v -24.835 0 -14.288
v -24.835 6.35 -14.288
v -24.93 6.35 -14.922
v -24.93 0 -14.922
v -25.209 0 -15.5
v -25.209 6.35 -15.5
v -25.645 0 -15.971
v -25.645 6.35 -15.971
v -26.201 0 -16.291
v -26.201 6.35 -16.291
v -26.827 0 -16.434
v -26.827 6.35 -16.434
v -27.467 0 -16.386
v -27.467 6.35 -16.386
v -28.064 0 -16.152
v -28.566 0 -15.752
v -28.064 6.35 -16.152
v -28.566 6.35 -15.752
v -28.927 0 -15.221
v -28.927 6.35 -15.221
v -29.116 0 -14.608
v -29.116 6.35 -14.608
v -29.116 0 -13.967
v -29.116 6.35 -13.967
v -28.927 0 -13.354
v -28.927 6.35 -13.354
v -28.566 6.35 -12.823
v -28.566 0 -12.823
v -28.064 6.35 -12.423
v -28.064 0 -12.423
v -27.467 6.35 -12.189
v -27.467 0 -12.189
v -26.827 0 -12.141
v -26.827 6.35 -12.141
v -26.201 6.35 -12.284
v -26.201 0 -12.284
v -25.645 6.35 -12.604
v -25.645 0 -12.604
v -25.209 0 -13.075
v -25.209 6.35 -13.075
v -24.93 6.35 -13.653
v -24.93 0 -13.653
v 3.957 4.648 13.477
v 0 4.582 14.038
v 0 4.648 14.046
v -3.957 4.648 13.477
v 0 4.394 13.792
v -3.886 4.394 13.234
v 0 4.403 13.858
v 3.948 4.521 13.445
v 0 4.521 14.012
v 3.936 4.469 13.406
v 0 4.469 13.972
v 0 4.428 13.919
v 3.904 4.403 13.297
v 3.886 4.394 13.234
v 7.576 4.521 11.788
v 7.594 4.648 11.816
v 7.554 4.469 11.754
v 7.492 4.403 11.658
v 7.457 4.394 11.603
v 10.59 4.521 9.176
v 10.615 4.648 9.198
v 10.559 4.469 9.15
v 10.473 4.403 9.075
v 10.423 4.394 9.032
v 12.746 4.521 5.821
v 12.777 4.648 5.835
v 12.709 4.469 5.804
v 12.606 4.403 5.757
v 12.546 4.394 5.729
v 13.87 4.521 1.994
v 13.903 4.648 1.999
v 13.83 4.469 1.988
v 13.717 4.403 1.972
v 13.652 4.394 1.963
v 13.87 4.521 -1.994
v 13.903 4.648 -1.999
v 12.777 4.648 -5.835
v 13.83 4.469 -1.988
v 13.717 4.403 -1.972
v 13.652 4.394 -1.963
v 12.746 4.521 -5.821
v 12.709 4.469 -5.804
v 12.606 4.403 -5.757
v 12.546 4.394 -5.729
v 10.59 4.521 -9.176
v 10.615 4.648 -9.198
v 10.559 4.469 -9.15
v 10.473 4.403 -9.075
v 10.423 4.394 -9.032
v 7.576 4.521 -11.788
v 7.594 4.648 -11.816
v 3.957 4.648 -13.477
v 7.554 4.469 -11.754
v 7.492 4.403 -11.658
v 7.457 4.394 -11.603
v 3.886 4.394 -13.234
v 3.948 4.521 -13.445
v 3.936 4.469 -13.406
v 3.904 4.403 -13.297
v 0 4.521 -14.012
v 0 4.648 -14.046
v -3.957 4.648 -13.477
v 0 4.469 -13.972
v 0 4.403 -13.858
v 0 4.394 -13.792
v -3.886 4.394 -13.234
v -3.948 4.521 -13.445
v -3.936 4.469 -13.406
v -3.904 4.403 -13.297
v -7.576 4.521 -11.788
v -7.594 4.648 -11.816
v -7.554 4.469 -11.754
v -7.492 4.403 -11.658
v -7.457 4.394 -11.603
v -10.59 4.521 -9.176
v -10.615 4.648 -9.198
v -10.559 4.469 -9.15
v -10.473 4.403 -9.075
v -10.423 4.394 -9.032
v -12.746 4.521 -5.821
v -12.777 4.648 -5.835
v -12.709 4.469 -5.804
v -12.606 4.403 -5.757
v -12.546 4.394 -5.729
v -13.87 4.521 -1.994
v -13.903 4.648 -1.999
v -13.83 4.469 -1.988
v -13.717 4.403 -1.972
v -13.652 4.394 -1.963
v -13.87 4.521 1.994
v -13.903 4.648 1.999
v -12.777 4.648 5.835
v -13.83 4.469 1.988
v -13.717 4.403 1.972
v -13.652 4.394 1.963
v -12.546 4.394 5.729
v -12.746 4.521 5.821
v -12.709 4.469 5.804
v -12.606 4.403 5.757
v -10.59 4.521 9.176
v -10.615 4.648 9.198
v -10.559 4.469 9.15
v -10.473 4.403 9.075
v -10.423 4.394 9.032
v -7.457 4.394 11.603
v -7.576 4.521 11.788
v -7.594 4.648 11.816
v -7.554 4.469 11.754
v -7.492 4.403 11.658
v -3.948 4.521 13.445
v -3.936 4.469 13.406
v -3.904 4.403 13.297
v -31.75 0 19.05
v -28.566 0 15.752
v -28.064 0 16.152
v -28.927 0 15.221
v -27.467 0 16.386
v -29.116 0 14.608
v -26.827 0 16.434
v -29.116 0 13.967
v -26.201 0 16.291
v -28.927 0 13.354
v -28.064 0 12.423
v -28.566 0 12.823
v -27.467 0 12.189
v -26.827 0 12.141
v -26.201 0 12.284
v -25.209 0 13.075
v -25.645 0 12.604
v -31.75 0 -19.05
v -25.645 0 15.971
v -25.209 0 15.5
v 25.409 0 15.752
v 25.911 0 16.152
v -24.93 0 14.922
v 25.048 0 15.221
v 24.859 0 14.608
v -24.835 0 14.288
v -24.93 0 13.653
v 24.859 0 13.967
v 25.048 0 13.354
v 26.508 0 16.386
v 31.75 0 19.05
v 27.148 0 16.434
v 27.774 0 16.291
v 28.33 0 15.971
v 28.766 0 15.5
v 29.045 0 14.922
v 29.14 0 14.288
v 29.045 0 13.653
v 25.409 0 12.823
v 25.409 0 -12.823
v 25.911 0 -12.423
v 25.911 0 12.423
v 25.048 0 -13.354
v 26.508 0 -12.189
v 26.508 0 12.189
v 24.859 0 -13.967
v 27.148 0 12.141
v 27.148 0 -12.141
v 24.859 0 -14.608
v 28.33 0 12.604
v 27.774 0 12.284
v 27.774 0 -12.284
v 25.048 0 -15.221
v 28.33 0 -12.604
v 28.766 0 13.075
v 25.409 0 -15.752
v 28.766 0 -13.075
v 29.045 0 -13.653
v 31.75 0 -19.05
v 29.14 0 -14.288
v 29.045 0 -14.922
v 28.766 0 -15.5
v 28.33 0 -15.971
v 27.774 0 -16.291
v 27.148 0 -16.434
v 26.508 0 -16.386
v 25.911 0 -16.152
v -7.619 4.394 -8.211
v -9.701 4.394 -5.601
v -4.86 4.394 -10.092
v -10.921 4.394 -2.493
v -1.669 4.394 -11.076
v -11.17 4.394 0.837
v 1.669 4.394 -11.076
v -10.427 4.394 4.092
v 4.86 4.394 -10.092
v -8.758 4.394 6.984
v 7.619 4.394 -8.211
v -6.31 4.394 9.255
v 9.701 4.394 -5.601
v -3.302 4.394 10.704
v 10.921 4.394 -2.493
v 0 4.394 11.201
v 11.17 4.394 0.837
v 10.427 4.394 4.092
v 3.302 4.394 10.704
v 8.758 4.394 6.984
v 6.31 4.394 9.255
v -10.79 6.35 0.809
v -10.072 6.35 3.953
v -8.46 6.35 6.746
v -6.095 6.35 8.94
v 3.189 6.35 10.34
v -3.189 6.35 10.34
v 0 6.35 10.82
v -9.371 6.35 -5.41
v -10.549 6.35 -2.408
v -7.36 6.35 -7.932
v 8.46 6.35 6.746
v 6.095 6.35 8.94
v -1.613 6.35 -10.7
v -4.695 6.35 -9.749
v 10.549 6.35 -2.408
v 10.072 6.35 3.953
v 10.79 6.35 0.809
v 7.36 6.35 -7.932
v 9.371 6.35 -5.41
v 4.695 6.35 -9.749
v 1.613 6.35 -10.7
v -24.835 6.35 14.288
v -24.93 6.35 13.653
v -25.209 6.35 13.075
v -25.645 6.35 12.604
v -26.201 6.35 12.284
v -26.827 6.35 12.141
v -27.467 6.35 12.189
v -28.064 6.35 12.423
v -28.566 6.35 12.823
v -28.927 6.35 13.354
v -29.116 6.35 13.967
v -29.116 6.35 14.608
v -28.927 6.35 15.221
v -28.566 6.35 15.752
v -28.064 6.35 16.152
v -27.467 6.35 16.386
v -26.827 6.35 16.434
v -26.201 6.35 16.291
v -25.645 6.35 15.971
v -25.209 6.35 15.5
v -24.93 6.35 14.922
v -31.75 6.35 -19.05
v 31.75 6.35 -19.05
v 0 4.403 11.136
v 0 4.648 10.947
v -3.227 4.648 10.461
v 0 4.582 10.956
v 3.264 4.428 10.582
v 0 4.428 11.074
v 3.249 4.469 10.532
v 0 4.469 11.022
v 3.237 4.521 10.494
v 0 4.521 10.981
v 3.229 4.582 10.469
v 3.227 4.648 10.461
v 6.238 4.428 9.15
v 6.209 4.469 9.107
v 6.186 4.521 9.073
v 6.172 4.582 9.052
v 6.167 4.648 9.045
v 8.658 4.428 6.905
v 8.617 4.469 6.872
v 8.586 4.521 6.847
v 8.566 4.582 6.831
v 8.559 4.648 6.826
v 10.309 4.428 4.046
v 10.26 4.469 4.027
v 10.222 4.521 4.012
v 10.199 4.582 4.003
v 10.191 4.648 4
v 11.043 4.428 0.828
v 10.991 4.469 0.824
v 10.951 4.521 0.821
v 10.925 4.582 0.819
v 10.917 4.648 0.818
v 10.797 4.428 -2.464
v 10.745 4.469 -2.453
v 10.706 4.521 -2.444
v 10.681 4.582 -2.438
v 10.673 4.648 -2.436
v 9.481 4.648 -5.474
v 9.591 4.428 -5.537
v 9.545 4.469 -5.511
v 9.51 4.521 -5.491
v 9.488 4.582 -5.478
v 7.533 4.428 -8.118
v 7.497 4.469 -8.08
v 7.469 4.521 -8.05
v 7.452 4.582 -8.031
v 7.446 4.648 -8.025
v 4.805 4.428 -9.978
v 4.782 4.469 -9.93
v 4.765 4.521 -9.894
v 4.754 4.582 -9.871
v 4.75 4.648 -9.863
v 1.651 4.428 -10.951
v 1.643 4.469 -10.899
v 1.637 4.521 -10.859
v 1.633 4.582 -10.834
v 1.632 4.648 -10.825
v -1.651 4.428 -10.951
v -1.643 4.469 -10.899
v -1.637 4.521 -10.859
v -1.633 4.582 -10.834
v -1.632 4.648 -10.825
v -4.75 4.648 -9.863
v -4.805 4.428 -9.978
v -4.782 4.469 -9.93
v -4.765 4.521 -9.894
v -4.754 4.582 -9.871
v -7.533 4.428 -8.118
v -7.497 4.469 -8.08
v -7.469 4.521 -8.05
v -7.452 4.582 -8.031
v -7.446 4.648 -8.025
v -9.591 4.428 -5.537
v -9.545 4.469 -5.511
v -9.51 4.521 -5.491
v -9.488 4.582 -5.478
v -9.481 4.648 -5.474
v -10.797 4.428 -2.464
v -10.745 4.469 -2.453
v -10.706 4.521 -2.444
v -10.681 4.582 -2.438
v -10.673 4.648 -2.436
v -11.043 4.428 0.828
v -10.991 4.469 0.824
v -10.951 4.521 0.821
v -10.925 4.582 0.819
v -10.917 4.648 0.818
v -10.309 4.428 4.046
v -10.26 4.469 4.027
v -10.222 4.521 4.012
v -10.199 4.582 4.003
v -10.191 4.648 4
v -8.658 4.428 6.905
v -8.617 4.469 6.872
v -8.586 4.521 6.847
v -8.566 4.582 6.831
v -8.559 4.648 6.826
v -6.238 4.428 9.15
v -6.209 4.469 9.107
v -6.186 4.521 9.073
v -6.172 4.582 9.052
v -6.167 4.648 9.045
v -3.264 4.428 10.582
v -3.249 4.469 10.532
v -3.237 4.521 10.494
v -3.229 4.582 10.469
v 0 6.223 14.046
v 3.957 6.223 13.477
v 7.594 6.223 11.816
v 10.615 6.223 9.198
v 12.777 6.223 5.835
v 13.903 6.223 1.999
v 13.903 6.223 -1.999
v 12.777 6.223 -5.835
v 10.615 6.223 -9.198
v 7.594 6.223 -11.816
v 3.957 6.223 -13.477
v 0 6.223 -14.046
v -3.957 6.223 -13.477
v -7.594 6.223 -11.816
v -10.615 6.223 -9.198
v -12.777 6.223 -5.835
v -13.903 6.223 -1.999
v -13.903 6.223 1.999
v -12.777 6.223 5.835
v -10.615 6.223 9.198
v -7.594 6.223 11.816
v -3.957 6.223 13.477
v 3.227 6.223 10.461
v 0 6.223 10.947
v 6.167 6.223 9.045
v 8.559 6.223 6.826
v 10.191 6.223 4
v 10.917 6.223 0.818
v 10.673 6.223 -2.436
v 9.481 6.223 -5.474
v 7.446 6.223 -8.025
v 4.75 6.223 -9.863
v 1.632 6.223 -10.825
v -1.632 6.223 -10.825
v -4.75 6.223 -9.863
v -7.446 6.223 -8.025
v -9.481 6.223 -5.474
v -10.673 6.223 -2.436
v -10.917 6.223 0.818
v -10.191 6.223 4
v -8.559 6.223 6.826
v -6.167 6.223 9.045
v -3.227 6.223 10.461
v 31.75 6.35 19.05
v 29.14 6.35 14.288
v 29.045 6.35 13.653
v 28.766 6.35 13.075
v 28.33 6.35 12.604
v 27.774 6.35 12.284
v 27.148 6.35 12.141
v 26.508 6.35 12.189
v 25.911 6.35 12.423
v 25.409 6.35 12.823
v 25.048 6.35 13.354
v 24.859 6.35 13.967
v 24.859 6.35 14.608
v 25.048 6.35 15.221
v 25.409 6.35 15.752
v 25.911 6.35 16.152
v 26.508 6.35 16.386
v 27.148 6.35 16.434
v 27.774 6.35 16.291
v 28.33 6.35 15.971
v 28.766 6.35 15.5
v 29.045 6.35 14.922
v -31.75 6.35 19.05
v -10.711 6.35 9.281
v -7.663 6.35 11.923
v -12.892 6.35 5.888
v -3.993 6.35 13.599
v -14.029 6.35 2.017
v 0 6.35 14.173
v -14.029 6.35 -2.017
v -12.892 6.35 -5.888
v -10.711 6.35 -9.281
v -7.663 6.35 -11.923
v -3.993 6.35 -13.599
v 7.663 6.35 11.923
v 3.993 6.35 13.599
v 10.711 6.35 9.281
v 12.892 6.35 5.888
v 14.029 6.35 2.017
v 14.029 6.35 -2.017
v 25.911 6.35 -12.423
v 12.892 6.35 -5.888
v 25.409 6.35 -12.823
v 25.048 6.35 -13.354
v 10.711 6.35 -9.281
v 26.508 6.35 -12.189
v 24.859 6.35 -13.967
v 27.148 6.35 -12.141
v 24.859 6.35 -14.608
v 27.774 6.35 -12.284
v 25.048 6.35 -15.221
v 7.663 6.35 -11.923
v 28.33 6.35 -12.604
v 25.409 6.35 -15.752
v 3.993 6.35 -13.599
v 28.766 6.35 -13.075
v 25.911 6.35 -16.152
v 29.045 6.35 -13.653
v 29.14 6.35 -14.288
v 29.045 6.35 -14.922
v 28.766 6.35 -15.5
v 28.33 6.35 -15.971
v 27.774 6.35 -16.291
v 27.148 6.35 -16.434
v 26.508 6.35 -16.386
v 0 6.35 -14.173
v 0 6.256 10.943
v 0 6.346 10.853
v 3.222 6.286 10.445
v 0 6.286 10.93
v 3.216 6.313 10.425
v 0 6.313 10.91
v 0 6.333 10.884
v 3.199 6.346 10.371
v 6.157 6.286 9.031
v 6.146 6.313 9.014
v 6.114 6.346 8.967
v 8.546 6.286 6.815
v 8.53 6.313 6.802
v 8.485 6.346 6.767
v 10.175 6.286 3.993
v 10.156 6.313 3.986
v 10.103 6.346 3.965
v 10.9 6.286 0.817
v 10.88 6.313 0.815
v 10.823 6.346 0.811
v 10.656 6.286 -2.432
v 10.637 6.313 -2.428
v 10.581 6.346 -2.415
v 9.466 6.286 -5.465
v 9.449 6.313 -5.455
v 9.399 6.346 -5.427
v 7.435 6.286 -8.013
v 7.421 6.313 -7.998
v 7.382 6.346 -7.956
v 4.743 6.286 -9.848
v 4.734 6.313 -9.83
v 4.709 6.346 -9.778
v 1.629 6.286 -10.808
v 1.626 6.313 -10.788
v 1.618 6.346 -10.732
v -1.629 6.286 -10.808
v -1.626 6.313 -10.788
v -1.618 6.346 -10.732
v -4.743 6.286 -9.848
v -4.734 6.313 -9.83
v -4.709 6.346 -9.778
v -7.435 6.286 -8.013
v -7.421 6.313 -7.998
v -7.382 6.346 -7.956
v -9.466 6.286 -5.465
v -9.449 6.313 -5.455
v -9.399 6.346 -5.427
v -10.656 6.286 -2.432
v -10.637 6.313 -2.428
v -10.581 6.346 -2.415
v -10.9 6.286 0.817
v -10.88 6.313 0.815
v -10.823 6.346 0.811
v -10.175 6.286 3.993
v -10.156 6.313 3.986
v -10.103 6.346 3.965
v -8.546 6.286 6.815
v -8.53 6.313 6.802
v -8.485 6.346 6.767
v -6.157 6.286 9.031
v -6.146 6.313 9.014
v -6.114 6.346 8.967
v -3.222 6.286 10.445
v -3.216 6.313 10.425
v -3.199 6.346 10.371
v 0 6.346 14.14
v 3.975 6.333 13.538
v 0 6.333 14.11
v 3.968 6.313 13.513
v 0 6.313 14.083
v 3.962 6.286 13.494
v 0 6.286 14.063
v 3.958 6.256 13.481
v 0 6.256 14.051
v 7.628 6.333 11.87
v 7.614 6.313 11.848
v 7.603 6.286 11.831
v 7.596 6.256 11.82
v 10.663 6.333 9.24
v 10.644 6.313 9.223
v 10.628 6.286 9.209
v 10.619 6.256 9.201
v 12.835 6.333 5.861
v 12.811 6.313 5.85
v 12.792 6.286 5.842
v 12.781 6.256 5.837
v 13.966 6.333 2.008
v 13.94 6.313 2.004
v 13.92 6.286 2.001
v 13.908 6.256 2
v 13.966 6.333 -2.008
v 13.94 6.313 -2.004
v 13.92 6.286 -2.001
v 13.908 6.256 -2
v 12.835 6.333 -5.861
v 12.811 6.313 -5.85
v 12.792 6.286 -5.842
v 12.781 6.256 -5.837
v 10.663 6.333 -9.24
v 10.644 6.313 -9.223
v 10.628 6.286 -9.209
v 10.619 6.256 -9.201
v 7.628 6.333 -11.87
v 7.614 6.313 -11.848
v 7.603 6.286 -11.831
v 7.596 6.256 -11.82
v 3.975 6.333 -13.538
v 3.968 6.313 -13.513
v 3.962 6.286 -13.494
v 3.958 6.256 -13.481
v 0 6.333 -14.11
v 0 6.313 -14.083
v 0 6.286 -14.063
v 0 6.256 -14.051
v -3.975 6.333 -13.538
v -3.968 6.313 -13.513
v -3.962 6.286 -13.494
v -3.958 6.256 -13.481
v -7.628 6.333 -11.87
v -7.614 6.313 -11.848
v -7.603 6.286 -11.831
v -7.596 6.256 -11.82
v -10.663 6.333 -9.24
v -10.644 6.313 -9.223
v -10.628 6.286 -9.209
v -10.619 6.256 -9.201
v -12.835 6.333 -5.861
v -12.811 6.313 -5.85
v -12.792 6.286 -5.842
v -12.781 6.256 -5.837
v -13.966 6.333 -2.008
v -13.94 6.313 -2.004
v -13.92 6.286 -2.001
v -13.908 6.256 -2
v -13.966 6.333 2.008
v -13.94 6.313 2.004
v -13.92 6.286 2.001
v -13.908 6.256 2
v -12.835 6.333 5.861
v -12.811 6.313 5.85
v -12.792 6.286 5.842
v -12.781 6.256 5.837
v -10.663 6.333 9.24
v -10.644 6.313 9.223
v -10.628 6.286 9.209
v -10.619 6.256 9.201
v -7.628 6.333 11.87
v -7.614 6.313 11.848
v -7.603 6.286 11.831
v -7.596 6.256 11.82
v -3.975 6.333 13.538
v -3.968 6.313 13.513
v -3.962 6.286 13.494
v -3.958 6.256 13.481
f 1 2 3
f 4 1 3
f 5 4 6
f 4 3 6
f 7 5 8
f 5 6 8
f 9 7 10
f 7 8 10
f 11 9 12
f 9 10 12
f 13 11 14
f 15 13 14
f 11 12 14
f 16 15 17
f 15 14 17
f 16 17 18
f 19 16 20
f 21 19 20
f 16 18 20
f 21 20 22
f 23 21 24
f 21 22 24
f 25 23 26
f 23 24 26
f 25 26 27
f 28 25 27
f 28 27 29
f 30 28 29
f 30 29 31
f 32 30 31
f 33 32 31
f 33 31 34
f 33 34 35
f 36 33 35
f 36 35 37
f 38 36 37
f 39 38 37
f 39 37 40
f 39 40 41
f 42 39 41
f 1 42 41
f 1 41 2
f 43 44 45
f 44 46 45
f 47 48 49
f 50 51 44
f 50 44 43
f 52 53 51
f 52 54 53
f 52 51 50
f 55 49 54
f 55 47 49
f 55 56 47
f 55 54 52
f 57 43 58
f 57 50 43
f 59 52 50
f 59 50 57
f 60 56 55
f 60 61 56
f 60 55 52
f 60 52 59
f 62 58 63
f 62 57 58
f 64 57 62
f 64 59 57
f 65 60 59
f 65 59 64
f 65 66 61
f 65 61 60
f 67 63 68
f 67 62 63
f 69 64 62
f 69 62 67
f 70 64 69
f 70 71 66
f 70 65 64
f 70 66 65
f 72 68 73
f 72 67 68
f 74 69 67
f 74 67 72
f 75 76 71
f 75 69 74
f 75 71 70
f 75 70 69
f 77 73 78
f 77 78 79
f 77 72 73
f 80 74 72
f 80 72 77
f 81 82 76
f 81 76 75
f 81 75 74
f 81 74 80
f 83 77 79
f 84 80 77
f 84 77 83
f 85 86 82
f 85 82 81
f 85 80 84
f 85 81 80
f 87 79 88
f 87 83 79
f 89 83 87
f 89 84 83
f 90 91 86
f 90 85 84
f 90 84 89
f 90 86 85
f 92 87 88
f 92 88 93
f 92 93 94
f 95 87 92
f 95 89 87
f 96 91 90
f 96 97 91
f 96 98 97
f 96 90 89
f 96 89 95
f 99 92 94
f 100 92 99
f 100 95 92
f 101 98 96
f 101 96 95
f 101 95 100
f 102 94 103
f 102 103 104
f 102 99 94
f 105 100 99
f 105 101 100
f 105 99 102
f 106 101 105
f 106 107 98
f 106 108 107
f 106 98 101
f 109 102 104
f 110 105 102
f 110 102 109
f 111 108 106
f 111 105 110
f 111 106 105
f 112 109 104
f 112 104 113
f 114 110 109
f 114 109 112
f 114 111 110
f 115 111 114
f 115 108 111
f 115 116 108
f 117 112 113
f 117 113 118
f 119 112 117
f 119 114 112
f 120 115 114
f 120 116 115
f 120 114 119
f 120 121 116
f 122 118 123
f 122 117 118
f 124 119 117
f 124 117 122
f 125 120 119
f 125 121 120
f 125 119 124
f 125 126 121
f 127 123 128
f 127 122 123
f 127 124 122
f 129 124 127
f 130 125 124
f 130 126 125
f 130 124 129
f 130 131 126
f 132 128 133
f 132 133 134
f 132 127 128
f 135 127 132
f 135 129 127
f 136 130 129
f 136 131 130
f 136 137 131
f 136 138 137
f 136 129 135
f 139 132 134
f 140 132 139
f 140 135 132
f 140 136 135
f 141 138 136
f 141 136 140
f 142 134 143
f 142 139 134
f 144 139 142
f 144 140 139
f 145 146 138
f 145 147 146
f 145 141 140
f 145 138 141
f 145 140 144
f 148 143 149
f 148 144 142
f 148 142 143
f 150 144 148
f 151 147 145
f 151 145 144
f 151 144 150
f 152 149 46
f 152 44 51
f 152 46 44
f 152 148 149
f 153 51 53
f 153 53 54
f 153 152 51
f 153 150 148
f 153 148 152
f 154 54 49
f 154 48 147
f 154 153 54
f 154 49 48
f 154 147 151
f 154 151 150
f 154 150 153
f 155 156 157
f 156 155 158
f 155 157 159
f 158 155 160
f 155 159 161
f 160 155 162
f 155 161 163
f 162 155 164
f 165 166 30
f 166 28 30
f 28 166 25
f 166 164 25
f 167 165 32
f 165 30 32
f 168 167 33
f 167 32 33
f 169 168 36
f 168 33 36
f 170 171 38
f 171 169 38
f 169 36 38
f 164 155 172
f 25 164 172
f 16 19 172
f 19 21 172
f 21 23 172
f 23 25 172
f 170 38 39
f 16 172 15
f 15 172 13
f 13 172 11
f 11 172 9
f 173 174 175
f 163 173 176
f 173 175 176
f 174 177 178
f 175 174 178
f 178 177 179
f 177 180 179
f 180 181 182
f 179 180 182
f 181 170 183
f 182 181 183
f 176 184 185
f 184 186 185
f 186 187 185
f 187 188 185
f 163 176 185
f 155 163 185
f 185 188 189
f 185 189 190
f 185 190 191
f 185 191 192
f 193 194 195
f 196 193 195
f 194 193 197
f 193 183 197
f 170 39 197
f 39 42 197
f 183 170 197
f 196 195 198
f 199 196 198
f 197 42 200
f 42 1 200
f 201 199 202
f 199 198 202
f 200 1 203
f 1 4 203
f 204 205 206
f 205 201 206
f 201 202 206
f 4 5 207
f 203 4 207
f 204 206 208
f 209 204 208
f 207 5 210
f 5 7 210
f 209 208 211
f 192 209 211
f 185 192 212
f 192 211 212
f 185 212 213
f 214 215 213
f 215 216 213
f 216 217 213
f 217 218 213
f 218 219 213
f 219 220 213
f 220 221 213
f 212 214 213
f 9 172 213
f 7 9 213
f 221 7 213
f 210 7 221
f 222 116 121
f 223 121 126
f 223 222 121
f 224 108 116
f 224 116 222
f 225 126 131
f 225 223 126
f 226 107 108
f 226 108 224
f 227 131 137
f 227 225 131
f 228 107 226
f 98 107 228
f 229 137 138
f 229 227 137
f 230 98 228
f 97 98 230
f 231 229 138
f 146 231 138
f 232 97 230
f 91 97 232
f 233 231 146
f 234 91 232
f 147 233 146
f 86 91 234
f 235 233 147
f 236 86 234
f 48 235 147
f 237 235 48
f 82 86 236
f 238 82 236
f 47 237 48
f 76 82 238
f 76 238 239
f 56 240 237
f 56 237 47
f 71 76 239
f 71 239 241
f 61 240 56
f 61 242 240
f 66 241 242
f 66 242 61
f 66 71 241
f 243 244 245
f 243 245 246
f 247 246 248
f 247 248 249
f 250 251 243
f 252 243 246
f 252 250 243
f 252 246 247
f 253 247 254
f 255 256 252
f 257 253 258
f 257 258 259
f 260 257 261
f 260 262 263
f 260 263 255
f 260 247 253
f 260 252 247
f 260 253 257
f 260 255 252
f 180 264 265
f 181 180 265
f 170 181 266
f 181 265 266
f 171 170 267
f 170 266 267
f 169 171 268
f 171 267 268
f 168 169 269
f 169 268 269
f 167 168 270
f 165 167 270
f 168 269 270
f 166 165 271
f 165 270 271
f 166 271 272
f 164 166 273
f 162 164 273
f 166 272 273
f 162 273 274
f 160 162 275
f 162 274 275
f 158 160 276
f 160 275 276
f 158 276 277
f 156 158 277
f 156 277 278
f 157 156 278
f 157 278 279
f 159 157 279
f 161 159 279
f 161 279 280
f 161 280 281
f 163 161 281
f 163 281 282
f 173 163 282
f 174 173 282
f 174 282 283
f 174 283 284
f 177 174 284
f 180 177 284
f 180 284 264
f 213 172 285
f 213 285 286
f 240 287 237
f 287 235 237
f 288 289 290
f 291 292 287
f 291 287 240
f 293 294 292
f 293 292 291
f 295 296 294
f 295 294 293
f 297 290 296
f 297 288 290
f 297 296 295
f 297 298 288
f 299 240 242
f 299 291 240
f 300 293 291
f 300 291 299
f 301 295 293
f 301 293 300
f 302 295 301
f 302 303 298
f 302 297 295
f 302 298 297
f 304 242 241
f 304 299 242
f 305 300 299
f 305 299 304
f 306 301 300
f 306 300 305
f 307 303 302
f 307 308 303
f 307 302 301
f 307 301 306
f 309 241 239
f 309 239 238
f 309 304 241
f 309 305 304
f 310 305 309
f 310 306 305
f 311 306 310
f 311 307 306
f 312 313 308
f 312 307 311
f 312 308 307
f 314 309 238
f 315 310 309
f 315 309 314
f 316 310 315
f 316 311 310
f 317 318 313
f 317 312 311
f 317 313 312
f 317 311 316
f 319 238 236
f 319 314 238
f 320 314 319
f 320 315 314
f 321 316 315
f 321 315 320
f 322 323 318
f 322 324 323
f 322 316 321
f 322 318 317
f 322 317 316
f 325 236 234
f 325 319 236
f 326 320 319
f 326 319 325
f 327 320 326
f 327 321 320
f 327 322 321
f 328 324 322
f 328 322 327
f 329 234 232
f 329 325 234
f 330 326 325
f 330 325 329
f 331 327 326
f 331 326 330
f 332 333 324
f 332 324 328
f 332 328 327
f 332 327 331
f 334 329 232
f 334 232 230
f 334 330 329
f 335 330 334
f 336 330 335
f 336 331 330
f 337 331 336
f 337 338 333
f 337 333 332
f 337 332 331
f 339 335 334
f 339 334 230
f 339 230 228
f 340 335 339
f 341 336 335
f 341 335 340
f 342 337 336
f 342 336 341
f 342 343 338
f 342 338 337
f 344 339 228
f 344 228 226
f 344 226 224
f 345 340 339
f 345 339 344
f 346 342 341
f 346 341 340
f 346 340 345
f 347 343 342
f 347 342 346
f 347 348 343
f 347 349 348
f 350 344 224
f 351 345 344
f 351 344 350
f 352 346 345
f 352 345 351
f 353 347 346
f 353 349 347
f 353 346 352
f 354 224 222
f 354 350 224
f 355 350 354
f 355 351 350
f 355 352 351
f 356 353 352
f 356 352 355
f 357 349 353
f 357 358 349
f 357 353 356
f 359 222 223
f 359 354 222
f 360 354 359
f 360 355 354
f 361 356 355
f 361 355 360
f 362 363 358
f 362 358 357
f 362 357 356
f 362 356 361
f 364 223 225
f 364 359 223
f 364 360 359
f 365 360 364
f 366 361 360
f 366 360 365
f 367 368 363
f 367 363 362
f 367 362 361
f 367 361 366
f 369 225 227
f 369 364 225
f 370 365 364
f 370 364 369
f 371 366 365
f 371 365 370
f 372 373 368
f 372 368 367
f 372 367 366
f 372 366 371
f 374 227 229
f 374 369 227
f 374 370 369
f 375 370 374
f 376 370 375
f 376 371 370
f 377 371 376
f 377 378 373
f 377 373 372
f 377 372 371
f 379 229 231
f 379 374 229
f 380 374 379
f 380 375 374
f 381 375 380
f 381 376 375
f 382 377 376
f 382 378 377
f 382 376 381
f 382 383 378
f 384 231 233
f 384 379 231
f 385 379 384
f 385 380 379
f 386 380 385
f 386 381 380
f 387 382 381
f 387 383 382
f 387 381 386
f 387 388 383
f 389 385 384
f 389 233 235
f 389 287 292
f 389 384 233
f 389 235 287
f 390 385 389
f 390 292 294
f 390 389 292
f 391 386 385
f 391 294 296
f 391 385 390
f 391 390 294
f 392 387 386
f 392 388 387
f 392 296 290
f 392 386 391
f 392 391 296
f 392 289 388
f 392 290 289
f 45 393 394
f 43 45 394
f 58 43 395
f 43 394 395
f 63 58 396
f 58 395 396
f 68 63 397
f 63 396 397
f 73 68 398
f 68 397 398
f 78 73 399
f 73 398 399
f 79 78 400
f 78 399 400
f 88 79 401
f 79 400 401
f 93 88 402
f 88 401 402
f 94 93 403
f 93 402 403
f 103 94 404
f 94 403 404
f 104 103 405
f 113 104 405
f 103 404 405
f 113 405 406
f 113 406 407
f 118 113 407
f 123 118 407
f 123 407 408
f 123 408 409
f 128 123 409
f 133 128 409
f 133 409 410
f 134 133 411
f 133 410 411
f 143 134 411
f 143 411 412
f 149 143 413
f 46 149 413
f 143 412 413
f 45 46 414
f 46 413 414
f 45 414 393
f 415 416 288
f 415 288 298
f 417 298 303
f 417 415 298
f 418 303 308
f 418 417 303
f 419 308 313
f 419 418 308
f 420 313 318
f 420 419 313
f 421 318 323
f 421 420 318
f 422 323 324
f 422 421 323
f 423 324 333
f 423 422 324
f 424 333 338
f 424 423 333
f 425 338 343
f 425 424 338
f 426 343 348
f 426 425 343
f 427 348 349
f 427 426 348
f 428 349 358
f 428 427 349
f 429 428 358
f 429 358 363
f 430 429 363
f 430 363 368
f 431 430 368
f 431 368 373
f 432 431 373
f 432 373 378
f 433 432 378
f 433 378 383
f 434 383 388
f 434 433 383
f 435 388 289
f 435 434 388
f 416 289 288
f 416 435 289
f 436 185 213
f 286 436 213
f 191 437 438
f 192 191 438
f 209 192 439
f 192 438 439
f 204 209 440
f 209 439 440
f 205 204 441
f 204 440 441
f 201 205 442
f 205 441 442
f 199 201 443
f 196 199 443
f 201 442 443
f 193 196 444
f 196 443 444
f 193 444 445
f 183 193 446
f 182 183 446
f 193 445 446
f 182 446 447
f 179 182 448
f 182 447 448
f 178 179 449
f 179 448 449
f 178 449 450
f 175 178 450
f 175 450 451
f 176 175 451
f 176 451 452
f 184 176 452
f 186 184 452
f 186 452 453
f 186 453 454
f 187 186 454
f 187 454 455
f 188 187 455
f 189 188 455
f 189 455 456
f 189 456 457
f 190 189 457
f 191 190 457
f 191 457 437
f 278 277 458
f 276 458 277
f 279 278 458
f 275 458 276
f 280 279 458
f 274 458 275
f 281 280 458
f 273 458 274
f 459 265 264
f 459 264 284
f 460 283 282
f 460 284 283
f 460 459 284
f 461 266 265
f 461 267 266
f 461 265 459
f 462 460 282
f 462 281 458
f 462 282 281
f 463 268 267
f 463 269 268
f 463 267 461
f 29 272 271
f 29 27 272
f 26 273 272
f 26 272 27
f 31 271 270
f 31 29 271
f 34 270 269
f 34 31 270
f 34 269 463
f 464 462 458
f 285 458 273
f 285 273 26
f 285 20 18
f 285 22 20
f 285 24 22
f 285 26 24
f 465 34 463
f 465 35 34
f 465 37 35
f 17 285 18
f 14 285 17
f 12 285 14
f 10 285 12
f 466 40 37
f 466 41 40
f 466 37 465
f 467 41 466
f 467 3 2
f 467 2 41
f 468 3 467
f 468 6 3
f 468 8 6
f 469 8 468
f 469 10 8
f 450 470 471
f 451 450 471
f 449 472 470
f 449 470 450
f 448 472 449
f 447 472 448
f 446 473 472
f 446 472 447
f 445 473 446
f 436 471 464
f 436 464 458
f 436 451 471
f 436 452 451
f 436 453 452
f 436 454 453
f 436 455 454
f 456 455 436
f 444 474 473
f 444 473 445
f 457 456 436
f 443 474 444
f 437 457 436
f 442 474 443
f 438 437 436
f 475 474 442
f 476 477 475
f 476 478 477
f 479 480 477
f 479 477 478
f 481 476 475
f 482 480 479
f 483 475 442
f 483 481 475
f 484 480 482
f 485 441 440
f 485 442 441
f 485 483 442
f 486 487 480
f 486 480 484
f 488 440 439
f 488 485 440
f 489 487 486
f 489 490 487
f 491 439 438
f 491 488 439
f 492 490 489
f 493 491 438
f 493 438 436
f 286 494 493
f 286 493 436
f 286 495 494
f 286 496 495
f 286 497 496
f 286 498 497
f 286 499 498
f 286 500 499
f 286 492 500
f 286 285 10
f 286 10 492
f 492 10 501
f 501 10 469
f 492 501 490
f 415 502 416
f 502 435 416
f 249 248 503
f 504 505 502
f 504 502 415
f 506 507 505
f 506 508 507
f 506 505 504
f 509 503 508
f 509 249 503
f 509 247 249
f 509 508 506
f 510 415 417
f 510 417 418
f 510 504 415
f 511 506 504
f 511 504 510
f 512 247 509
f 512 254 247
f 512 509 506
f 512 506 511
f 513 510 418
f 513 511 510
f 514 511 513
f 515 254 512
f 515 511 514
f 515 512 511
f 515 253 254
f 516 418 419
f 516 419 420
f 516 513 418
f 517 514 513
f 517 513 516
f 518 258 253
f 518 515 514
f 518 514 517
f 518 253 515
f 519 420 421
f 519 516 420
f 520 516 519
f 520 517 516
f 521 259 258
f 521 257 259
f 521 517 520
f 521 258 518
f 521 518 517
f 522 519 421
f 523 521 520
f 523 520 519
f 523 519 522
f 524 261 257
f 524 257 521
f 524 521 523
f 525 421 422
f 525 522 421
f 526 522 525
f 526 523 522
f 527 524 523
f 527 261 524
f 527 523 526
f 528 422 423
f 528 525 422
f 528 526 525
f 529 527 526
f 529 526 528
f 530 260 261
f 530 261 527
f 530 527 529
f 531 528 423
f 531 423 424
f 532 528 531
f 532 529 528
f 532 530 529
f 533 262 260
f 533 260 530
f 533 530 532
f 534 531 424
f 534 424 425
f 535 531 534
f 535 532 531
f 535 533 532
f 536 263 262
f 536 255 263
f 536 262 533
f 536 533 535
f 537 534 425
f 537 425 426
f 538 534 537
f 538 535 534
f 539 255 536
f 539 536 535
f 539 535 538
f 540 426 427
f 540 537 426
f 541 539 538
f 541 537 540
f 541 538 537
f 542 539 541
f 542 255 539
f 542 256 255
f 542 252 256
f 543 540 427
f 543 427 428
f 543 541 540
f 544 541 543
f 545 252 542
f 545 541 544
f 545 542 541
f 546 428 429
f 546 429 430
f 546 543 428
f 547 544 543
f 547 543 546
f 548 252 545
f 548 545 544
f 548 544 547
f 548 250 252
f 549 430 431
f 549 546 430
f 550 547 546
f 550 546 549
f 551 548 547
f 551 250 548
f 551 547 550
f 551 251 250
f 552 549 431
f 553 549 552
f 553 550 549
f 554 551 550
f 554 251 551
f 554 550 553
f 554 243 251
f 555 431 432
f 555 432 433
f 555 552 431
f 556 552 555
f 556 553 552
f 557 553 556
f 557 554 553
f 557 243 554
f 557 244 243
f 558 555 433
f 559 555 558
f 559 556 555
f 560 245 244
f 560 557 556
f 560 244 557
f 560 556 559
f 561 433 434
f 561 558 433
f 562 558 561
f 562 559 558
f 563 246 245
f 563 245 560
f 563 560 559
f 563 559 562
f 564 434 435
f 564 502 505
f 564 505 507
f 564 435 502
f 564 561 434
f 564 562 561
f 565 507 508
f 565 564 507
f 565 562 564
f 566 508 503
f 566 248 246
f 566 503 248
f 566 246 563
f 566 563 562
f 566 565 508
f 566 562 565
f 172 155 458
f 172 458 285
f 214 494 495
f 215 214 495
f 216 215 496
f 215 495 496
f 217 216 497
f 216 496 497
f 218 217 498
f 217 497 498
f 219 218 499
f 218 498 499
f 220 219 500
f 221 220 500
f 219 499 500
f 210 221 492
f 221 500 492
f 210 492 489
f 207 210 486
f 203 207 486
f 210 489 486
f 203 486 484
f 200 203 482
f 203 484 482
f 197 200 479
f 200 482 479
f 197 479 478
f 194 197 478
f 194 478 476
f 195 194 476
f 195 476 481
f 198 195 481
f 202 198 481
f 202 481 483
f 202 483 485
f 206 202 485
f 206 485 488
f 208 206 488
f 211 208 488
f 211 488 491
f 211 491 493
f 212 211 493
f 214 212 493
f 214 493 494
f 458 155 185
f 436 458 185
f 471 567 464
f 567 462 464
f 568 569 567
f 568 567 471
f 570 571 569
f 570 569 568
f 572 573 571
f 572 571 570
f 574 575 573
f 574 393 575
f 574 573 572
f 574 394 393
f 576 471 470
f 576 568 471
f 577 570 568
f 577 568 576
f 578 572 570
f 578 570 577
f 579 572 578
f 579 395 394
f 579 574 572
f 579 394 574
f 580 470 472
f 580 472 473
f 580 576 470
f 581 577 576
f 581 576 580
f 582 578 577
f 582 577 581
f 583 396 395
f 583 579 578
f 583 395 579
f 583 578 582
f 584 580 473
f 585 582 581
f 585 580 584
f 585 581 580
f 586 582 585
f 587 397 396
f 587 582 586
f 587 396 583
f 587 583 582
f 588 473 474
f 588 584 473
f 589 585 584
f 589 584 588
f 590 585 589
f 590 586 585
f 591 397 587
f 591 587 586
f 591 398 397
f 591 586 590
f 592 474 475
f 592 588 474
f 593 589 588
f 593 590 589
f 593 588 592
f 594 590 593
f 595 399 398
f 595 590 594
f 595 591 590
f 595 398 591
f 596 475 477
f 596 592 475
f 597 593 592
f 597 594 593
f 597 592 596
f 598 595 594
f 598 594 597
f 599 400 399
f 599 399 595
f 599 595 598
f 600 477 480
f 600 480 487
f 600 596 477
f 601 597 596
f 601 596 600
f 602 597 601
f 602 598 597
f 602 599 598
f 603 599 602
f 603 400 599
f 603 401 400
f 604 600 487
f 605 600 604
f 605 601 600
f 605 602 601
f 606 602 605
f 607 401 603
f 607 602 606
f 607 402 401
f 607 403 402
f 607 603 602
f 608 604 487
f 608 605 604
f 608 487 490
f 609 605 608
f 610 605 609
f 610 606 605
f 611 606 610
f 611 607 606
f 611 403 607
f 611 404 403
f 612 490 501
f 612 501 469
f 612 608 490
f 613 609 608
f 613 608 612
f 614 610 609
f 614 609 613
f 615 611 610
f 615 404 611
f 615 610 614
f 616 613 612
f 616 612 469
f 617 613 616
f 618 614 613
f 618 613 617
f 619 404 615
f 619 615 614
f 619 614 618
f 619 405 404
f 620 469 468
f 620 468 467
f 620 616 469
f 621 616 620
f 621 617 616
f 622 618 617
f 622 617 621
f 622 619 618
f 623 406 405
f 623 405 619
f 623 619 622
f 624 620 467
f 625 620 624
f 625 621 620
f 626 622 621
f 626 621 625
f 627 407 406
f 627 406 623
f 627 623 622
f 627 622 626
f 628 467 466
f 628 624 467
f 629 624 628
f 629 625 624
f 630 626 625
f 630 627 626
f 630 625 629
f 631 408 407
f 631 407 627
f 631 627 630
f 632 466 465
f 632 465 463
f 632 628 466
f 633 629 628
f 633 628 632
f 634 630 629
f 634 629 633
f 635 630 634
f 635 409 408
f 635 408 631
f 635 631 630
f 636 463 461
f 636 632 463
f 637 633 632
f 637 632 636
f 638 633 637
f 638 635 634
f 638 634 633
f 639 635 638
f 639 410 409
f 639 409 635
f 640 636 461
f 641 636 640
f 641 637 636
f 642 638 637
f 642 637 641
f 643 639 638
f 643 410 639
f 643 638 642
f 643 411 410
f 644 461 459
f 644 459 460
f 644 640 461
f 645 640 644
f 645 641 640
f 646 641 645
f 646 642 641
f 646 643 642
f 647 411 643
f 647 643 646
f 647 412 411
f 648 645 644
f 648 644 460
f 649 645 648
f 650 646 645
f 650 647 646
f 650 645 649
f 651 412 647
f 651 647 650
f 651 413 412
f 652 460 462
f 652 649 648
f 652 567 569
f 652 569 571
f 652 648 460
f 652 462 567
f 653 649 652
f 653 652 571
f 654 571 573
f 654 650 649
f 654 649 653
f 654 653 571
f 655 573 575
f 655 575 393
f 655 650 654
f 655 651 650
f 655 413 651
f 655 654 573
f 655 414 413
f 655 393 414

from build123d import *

# Parameters (mm, degrees)
SKETCH1_W             = 63.5
SKETCH1_H             = 38.1
BOSS_EXTRUDE1_DEPTH   = 6.35
SKETCH2_R             = 14.0462
SKETCH2_R_2           = 10.9474
CUT_EXTRUDE1_DEPTH    = 1.9558
F_8_CLEARANCE_HOLE1_D = 4.3053
FILLET1_R             = 0.127
FILLET2_R             = 0.254


with BuildPart() as part:
    # Sketch1 → Boss-Extrude1 (new body)
    with BuildSketch(Plane(origin=(0, 0, 0), x_dir=(1, 0, 0), z_dir=(0, 1, 0))):
        Rectangle(SKETCH1_W, SKETCH1_H)
    extrude(amount=BOSS_EXTRUDE1_DEPTH)

    # Sketch2 → Cut-Extrude1 (cut)
    with BuildSketch(Plane(origin=(0, 6.35, 0), x_dir=(1, 0, 0), z_dir=(0, 1, 0))):
        with Locations(Location((0, 0, 0), (0, 0, 270))):  # turned: the seam where the file's is
            Circle(SKETCH2_R)
        with Locations(Location((0, 0, 0), (0, 0, 270))):  # turned: the seam where the file's is
            Circle(SKETCH2_R_2, mode=Mode.SUBTRACT)
    extrude(amount=-CUT_EXTRUDE1_DEPTH, mode=Mode.SUBTRACT)

    # #8 Clearance Hole1 (through all)
    with Locations(Plane(origin=(0, 0, 0), x_dir=(-1, 0, 0), z_dir=(0, -1, 0))):
        with Locations((26.9875, -14.2875), (-26.9875, -14.2875), (-26.9875, 14.2875), (26.9875, 14.2875)):
            Hole(F_8_CLEARANCE_HOLE1_D / 2)

    # Fillet1
    fillet1_edges = [part.edges().sort_by_distance(p)[0] for p in [
        (0, 6.35, -14.0462),
        (0, 6.35, -10.9474),
    ]]
    fillet(fillet1_edges, radius=FILLET1_R)

    # Fillet2
    fillet2_edges = [part.edges().sort_by_distance(p)[0] for p in [
        (0, 4.3942, -14.0462),
        (0, 4.3942, -10.9474),
    ]]
    fillet(fillet2_edges, radius=FILLET2_R)


solid = part.part
